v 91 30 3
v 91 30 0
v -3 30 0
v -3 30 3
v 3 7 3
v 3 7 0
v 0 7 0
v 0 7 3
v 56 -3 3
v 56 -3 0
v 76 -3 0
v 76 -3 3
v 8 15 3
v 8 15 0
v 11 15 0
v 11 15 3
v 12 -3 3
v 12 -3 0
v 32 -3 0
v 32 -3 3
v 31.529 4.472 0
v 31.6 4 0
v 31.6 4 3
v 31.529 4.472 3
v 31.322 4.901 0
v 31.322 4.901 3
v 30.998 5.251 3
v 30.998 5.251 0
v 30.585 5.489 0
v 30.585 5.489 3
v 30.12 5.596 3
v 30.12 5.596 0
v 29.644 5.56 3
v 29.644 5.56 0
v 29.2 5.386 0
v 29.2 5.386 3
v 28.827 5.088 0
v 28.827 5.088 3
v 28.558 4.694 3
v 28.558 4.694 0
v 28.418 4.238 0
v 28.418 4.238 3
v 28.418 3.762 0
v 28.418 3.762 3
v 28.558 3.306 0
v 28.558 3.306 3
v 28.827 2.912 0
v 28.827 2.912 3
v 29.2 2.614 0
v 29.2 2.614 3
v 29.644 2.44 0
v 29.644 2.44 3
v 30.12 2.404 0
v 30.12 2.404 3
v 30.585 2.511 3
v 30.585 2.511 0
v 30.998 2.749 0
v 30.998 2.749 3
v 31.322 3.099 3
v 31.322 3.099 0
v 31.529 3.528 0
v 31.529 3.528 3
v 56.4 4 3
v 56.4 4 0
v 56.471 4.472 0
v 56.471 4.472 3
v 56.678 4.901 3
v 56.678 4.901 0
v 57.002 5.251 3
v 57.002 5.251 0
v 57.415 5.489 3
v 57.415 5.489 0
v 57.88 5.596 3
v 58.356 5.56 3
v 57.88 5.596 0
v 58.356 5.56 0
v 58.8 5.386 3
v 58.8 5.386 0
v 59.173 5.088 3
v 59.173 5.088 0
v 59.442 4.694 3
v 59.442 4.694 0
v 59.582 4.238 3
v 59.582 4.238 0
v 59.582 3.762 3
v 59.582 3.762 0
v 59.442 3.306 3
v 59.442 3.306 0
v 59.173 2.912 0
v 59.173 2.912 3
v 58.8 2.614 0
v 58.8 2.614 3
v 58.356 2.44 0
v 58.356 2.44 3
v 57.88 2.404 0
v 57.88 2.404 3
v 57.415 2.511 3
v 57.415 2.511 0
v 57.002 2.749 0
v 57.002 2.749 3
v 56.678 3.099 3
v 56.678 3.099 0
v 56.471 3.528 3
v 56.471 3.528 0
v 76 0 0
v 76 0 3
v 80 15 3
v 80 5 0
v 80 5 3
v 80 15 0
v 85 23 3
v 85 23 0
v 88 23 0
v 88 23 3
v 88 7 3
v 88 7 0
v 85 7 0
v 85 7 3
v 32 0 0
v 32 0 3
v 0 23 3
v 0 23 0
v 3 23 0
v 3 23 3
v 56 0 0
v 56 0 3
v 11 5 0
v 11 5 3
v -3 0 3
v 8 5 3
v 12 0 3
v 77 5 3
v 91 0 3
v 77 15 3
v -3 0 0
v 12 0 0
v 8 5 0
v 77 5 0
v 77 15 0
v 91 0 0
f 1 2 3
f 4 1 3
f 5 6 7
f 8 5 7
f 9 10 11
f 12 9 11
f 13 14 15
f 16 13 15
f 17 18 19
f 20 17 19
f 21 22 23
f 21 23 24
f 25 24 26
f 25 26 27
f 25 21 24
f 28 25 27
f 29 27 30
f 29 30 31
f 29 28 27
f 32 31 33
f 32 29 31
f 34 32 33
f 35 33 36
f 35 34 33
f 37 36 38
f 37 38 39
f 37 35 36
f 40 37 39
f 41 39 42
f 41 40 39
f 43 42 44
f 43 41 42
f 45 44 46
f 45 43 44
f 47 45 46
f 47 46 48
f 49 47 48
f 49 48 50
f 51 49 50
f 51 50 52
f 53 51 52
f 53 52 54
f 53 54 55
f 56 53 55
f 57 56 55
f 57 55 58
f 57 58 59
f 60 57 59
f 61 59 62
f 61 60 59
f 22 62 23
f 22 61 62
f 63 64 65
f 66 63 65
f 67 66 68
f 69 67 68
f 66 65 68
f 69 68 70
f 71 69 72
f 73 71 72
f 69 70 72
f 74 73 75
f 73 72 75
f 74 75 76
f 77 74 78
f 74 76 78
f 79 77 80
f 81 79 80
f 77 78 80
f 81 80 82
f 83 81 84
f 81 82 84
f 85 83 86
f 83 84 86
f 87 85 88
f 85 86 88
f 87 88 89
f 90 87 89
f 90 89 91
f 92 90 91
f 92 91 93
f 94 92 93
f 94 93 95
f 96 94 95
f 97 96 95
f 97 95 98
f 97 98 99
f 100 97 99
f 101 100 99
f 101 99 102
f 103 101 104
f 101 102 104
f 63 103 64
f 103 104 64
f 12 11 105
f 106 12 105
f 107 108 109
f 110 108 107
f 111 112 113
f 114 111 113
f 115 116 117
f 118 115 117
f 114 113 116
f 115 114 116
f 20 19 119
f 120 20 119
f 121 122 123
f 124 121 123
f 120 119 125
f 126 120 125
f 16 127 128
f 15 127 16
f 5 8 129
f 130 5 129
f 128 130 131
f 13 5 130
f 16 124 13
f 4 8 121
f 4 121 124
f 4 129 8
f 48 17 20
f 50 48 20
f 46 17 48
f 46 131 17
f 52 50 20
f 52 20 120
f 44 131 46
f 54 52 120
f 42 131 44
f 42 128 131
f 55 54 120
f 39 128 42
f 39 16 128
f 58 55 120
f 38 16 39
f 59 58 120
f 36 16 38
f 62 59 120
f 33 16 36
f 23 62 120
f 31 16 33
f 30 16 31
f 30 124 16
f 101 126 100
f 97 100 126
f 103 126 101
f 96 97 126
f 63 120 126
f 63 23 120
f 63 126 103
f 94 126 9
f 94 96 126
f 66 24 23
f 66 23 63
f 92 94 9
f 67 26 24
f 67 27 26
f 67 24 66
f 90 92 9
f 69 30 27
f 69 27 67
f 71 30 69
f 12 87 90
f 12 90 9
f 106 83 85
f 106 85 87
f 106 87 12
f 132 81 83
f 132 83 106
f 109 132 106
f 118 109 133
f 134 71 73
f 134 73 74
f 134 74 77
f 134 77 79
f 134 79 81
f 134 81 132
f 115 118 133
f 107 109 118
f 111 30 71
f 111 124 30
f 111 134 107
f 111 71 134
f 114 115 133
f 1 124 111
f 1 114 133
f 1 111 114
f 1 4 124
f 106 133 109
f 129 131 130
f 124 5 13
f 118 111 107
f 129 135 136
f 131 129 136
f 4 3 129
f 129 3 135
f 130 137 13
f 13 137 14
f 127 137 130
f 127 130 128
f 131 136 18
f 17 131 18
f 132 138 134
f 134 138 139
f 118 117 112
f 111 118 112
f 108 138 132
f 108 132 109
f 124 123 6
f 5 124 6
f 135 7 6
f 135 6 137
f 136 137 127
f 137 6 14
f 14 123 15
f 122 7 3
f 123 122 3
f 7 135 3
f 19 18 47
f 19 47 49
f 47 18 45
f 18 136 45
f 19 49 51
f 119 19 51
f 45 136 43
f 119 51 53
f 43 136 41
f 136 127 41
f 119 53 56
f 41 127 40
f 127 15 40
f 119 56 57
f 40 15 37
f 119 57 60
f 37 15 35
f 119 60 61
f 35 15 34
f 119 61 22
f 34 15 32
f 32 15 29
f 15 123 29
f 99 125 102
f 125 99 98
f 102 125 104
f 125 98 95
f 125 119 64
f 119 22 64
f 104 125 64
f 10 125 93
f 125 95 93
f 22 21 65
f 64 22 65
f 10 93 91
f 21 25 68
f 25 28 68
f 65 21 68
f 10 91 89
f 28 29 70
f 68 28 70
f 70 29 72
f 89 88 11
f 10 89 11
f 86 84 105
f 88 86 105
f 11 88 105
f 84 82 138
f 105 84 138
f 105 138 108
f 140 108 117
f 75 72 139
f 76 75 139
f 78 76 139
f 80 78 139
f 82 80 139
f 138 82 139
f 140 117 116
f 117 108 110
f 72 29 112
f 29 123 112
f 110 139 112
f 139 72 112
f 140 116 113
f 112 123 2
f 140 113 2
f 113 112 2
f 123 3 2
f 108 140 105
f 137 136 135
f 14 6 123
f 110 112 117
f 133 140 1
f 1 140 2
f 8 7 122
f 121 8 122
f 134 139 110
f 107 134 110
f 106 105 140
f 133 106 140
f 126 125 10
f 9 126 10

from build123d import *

# Parameters (mm, degrees)
SKETCH_1_R      = 1.6
SKETCH_1_W      = 3
SKETCH_1_H      = 10
EXTRUDE_1_DEPTH = 3


with BuildPart() as part:
    # 草图1 → 凸台-拉伸1 (new body)
    with BuildSketch(Plane.XY):
        Polygon((32, 0), (44, 0), (56, 0), (56, -3), (76, -3), (76, 0), (88, 0), (91, 0), (91, 30), (88, 30), (0, 30), (-3, 30), (-3, 0), (0, 0), (12, 0), (12, -3), (32, -3), align=None)
        with Locations((30, 4)):
            Circle(SKETCH_1_R, mode=Mode.SUBTRACT)
        with Locations((9.5, 10)):
            Rectangle(SKETCH_1_W, SKETCH_1_H, mode=Mode.SUBTRACT)
        with BuildLine():
            ThreePointArc((59.6, 4), (58, 2.4), (56.4, 4))
            ThreePointArc((56.4, 4), (58, 5.6), (59.6, 4))
        make_face(mode=Mode.SUBTRACT)
        with Locations((78.5, 10)):
            Rectangle(SKETCH_1_W, SKETCH_1_H, mode=Mode.SUBTRACT)
        Polygon((0, 15), (0, 23), (3, 23), (3, 15), (3, 7), (0, 7), align=None, mode=Mode.SUBTRACT)
        Polygon((85, 23), (88, 23), (88, 15), (88, 7), (85, 7), (85, 15), align=None, mode=Mode.SUBTRACT)
    extrude(amount=EXTRUDE_1_DEPTH)


solid = part.part
